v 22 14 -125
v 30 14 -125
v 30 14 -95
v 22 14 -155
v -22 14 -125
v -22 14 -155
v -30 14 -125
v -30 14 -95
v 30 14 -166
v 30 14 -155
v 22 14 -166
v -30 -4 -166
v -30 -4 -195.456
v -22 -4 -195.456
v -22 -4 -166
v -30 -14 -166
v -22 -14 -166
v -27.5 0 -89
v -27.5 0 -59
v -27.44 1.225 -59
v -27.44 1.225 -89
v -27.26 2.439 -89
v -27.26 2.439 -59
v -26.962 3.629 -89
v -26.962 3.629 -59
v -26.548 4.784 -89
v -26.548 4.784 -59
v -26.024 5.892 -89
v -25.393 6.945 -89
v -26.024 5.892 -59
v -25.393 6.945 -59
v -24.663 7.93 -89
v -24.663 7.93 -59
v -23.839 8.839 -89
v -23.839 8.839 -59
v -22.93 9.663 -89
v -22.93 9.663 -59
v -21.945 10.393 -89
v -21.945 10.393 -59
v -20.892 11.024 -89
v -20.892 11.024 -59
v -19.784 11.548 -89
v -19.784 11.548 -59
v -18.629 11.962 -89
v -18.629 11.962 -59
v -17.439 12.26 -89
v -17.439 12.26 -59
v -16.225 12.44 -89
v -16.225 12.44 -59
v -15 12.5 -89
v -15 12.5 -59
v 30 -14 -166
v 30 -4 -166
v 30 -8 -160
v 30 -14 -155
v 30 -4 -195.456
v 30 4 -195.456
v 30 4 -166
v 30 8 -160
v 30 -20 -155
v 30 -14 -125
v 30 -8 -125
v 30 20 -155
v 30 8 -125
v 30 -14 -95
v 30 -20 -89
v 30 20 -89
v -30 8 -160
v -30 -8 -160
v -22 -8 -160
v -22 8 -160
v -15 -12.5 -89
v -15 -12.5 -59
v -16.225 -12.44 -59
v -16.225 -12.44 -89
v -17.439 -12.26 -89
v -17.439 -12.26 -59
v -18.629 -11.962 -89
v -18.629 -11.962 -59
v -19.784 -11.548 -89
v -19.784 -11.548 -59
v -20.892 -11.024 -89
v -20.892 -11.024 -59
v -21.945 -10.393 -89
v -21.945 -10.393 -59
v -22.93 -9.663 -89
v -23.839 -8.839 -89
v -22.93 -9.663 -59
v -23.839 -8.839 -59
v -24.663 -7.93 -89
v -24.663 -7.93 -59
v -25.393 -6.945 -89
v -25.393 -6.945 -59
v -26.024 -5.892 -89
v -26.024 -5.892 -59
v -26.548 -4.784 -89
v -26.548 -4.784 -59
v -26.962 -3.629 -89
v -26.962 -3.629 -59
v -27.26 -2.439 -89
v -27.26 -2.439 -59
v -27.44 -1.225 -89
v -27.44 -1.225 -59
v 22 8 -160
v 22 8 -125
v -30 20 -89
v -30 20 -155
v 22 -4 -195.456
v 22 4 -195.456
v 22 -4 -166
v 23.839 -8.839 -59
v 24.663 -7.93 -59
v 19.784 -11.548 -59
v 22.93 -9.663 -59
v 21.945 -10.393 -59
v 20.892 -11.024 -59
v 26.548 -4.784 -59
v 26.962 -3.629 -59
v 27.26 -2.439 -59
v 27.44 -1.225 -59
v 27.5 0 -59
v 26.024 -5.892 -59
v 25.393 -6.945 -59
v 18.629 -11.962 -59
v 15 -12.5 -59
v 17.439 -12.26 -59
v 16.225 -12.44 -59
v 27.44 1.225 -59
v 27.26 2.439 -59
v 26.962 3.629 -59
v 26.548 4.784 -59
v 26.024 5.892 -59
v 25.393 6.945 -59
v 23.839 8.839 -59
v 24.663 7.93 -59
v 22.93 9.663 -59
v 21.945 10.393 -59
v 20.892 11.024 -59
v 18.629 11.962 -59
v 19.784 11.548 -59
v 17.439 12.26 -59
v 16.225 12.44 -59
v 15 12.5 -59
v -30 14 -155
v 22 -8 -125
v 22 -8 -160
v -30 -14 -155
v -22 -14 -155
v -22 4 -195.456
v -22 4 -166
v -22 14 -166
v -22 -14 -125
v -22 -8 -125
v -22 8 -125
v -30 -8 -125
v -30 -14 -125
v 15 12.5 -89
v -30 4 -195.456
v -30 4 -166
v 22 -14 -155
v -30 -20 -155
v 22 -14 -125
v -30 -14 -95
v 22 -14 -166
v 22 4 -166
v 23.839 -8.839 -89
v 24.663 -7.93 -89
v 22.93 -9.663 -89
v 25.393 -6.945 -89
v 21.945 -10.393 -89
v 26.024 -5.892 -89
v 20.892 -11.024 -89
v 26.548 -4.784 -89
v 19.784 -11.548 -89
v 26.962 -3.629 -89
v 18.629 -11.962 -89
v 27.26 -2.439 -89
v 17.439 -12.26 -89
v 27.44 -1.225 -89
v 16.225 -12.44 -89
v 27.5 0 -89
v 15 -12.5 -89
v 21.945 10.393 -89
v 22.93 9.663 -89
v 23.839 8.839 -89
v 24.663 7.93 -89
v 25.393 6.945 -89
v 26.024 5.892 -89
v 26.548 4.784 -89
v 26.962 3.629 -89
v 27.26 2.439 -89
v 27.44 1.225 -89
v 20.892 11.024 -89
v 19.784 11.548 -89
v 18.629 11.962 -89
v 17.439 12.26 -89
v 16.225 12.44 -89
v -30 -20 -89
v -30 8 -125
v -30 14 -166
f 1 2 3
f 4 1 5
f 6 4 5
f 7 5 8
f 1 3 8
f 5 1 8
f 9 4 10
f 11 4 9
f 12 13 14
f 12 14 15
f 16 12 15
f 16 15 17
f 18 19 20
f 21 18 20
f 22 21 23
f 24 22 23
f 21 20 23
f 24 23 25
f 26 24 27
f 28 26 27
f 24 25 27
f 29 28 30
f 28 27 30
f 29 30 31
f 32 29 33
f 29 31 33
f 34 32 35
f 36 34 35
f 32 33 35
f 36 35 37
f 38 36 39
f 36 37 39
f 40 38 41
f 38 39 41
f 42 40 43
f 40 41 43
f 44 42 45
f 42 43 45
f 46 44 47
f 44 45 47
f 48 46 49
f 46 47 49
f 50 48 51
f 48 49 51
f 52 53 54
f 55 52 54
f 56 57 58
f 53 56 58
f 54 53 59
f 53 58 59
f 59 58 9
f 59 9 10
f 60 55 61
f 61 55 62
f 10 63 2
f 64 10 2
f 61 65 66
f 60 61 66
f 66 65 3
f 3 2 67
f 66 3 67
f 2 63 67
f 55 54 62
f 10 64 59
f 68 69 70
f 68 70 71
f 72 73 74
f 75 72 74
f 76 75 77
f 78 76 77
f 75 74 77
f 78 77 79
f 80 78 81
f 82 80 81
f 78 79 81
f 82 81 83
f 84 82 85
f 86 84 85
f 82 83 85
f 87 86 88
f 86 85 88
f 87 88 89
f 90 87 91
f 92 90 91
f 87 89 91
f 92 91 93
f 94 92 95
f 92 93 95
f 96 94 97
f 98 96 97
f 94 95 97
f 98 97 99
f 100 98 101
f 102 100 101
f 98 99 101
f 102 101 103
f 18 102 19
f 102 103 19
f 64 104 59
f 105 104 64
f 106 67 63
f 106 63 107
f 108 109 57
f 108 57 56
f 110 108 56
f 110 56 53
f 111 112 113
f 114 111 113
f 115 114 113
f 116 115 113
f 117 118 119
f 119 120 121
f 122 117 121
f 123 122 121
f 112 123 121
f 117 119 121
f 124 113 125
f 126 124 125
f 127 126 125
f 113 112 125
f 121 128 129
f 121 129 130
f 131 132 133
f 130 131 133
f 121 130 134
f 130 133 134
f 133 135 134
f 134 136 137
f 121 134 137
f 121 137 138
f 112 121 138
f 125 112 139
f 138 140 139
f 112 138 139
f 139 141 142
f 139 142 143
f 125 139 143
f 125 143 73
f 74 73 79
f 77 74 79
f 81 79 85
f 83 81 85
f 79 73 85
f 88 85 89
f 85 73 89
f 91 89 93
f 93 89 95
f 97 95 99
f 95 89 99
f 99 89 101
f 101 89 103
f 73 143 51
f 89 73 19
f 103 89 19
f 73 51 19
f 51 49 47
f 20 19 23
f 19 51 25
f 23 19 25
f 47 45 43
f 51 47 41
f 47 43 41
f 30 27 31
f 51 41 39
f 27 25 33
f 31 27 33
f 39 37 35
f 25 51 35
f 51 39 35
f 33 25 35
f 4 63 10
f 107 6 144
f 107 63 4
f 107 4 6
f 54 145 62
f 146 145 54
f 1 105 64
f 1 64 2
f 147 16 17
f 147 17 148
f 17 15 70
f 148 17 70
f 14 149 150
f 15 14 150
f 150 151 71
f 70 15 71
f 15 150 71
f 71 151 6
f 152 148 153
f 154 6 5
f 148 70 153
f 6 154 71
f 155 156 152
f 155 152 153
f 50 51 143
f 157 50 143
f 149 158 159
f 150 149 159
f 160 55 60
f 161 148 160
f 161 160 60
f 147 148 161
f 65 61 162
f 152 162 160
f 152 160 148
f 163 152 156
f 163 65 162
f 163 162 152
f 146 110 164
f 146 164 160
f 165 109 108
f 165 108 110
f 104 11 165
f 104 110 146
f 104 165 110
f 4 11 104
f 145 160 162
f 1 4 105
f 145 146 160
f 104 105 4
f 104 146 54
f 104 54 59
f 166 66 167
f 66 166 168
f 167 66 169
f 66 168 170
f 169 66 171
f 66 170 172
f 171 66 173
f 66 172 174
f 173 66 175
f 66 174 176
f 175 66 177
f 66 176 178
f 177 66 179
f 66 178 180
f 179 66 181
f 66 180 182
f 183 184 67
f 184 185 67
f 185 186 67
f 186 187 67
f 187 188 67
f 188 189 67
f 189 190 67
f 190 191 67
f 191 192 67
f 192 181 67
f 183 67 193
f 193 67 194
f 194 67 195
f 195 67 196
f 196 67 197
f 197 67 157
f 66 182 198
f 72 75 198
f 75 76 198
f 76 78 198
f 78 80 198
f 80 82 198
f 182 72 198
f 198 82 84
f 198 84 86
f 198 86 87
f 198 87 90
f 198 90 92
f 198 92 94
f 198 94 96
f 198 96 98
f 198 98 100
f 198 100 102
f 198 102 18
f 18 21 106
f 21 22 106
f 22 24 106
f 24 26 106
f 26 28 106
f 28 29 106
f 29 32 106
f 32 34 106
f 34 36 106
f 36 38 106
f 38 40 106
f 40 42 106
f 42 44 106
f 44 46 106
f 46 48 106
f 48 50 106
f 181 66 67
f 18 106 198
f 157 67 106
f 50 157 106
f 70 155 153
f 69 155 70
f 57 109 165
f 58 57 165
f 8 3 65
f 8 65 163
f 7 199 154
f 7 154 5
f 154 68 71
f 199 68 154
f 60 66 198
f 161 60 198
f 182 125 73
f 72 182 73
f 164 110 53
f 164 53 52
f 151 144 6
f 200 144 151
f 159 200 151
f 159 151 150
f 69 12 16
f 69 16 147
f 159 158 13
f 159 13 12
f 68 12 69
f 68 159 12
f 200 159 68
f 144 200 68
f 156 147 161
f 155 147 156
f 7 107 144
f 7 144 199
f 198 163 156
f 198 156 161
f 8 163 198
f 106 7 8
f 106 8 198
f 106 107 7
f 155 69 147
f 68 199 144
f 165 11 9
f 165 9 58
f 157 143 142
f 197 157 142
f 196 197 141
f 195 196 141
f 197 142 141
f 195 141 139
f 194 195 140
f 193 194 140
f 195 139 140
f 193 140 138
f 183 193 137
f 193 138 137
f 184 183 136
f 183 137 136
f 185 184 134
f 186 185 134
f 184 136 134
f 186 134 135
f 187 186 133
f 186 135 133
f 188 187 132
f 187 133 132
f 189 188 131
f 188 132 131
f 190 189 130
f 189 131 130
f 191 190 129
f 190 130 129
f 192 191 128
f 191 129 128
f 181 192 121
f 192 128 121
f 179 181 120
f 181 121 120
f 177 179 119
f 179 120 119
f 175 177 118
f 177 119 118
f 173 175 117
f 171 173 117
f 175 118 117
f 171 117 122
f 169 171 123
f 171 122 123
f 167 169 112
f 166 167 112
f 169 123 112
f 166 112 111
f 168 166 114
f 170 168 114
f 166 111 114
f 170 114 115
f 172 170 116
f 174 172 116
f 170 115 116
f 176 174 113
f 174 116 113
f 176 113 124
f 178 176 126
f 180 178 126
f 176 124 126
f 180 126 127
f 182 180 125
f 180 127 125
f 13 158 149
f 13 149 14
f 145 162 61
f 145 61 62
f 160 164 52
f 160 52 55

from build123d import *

# Parameters (mm, degrees)
SKETCH_1_R             = 7
EXTRUDE_1_DEPTH        = 160
EXTRUDE_1_DEPTH_BACK   = 36
SKETCH_2_R             = 7
EXTRUDE_2_DEPTH        = 8
SKETCH_3_W             = 18
SKETCH_3_H             = 11
EXTRUDE_3_DEPTH        = 15
EXTRUDE_4_DEPTH        = 30
SKETCH_5_W             = 60
SKETCH_5_H             = 40
EXTRUDE_5_DEPTH        = 6
SKETCH_6_W             = 60
SKETCH_6_H             = 6
EXTRUDE_6_DEPTH        = 60
SKETCH_7_W             = 29.455878384
SKETCH_7_H             = 4
EXTRUDE_7_DEPTH        = 8
PATTERN_LINEAR_1_COUNT = 2
PATTERN_LINEAR_1_PITCH = 52
SKETCH_8_W             = 71.56654599
SKETCH_8_H             = 41.958718016
CUT_EXTRUDE_1_DEPTH    = 300


with BuildPart() as part:
    # 草图1 → 凸台-拉伸1 (new body, two sides)
    with BuildSketch(Plane.XY) as extrude_1_sk:
        Circle(SKETCH_1_R)
    extrude(amount=EXTRUDE_1_DEPTH)
    extrude(extrude_1_sk.sketch, amount=-EXTRUDE_1_DEPTH_BACK)

    # 草图2 → 凸台-拉伸2 (add)
    with BuildSketch(Plane(origin=(0, 0, -36), x_dir=(-1, 0, 0), z_dir=(0, 0, -1))):
        Polygon((20, 7.5), (15, 12.5), (-15, 12.5), (-20, 7.5), (-20, -7.5), (-15, -12.5), (15, -12.5), (20, -7.5), align=None)
        Circle(SKETCH_2_R, mode=Mode.SUBTRACT)
        Circle(SKETCH_2_R)
    extrude(amount=EXTRUDE_2_DEPTH)

    # 草图3 → 凸台-拉伸3 (add)
    with BuildSketch(Plane(origin=(0, 0, -44), x_dir=(-1, 0, 0), z_dir=(0, 0, -1))):
        Rectangle(SKETCH_3_W, SKETCH_3_H)
    extrude(amount=EXTRUDE_3_DEPTH)

    # 草图4 → 凸台-拉伸4 (add)
    with BuildSketch(Plane(origin=(0, 0, -59), x_dir=(-1, 0, 0), z_dir=(0, 0, -1))):
        with BuildLine():
            Line((-15, -12.5), (-15, 12.5))
            ThreePointArc((-15, 12.5), (-27.5, 0), (-15, -12.5))
        make_face()
        with BuildLine():
            ThreePointArc((-3.77502784, 5.5), (-8.385621722, 10.606601718), (-15, 12.5))
            Line((-15, 12.5), (-15, -12.5))
            ThreePointArc((-15, -12.5), (-8.385621722, -10.606601718), (-3.77502784, -5.5))
            Line((-3.77502784, -5.5), (-9, -5.5))
            Line((-9, -5.5), (-9, 5.5))
            Line((-9, 5.5), (-3.77502784, 5.5))
        make_face()
        with BuildLine():
            ThreePointArc((-2.5, 0), (-2.822928267, 2.822928267), (-3.77502784, 5.5))
            Line((-3.77502784, 5.5), (-9, 5.5))
            Line((-9, 5.5), (-9, -5.5))
            Line((-9, -5.5), (-3.77502784, -5.5))
            ThreePointArc((-3.77502784, -5.5), (-2.822928267, -2.822928267), (-2.5, 0))
        make_face()
        with BuildLine():
            ThreePointArc((3.77502784, -5.5), (2.5, 0), (3.77502784, 5.5))
            Line((3.77502784, 5.5), (-3.77502784, 5.5))
            ThreePointArc((-3.77502784, 5.5), (-2.822928267, 2.822928267), (-2.5, 0))
            ThreePointArc((-2.5, 0), (-2.822928267, -2.822928267), (-3.77502784, -5.5))
            Line((-3.77502784, -5.5), (3.77502784, -5.5))
        make_face()
        with BuildLine():
            Line((9, 5.5), (3.77502784, 5.5))
            ThreePointArc((3.77502784, 5.5), (2.5, 0), (3.77502784, -5.5))
            Line((3.77502784, -5.5), (9, -5.5))
            Line((9, -5.5), (9, 5.5))
        make_face()
        with BuildLine():
            Line((15, -12.5), (15, 12.5))
            ThreePointArc((15, 12.5), (8.385621722, 10.606601718), (3.77502784, 5.5))
            Line((3.77502784, 5.5), (9, 5.5))
            Line((9, 5.5), (9, -5.5))
            Line((9, -5.5), (3.77502784, -5.5))
            ThreePointArc((3.77502784, -5.5), (8.385621722, -10.606601718), (15, -12.5))
        make_face()
        with BuildLine():
            ThreePointArc((27.5, 0), (23.838834765, 8.838834765), (15, 12.5))
            Line((15, 12.5), (15, -12.5))
            ThreePointArc((15, -12.5), (23.838834765, -8.838834765), (27.5, 0))
        make_face()
        with BuildLine():
            Line((-15, -12.5), (15, -12.5))
            ThreePointArc((15, -12.5), (8.385621722, -10.606601718), (3.77502784, -5.5))
            Line((3.77502784, -5.5), (-3.77502784, -5.5))
            ThreePointArc((-3.77502784, -5.5), (-8.385621722, -10.606601718), (-15, -12.5))
        make_face()
        with BuildLine():
            ThreePointArc((3.77502784, 5.5), (8.385621722, 10.606601718), (15, 12.5))
            Line((15, 12.5), (-15, 12.5))
            ThreePointArc((-15, 12.5), (-8.385621722, 10.606601718), (-3.77502784, 5.5))
            Line((-3.77502784, 5.5), (3.77502784, 5.5))
        make_face()
    extrude(amount=EXTRUDE_4_DEPTH)

    # 草图5 → 凸台-拉伸5 (add)
    with BuildSketch(Plane(origin=(0, 0, -89), x_dir=(-1, 0, 0), z_dir=(0, 0, -1))):
        Rectangle(SKETCH_5_W, SKETCH_5_H)
    extrude(amount=EXTRUDE_5_DEPTH)

    # 草图6 → 凸台-拉伸6 (add)
    with BuildSketch(Plane(origin=(0, 0, -95), x_dir=(-1, 0, 0), z_dir=(0, 0, -1))):
        with Locations((0, 17)):
            Rectangle(SKETCH_6_W, SKETCH_6_H)
        with Locations((0, -17)):
            Rectangle(SKETCH_6_W, SKETCH_6_H)
    extrude(amount=EXTRUDE_6_DEPTH)

    # 草图7 → 凸台-拉伸7 (add)
    with BuildSketch(Plane.ZY.offset(30)):
        Polygon((-125, 8), (-125, 14), (-155, 14), (-160, 14), (-160, 8), align=None)
        Polygon((-125, -8), (-160, -8), (-160, -14), (-155, -14), (-125, -14), align=None)
        Polygon((-160, 8), (-160, 14), (-166, 14), (-166, 4), (-166, 0), (-166, -4), (-166, -14), (-160, -14), (-160, -8), align=None)
        with Locations((-180.727939192, -2)):
            Rectangle(SKETCH_7_W, SKETCH_7_H)
        with Locations((-180.727939192, 2)):
            Rectangle(SKETCH_7_W, SKETCH_7_H)
    extrude_7 = extrude(amount=-EXTRUDE_7_DEPTH)

    # 阵列(线性)1: 凸台-拉伸7 ×2
    with Locations(*[(i * PATTERN_LINEAR_1_PITCH, 0, 0) for i in range(1, PATTERN_LINEAR_1_COUNT)]):
        add(extrude_7)

    # 草图8 → 切除-拉伸1 (cut)
    with BuildSketch(Plane.XY.offset(-59)):
        Rectangle(SKETCH_8_W, SKETCH_8_H)
    extrude(amount=CUT_EXTRUDE_1_DEPTH, mode=Mode.SUBTRACT)


solid = part.part
